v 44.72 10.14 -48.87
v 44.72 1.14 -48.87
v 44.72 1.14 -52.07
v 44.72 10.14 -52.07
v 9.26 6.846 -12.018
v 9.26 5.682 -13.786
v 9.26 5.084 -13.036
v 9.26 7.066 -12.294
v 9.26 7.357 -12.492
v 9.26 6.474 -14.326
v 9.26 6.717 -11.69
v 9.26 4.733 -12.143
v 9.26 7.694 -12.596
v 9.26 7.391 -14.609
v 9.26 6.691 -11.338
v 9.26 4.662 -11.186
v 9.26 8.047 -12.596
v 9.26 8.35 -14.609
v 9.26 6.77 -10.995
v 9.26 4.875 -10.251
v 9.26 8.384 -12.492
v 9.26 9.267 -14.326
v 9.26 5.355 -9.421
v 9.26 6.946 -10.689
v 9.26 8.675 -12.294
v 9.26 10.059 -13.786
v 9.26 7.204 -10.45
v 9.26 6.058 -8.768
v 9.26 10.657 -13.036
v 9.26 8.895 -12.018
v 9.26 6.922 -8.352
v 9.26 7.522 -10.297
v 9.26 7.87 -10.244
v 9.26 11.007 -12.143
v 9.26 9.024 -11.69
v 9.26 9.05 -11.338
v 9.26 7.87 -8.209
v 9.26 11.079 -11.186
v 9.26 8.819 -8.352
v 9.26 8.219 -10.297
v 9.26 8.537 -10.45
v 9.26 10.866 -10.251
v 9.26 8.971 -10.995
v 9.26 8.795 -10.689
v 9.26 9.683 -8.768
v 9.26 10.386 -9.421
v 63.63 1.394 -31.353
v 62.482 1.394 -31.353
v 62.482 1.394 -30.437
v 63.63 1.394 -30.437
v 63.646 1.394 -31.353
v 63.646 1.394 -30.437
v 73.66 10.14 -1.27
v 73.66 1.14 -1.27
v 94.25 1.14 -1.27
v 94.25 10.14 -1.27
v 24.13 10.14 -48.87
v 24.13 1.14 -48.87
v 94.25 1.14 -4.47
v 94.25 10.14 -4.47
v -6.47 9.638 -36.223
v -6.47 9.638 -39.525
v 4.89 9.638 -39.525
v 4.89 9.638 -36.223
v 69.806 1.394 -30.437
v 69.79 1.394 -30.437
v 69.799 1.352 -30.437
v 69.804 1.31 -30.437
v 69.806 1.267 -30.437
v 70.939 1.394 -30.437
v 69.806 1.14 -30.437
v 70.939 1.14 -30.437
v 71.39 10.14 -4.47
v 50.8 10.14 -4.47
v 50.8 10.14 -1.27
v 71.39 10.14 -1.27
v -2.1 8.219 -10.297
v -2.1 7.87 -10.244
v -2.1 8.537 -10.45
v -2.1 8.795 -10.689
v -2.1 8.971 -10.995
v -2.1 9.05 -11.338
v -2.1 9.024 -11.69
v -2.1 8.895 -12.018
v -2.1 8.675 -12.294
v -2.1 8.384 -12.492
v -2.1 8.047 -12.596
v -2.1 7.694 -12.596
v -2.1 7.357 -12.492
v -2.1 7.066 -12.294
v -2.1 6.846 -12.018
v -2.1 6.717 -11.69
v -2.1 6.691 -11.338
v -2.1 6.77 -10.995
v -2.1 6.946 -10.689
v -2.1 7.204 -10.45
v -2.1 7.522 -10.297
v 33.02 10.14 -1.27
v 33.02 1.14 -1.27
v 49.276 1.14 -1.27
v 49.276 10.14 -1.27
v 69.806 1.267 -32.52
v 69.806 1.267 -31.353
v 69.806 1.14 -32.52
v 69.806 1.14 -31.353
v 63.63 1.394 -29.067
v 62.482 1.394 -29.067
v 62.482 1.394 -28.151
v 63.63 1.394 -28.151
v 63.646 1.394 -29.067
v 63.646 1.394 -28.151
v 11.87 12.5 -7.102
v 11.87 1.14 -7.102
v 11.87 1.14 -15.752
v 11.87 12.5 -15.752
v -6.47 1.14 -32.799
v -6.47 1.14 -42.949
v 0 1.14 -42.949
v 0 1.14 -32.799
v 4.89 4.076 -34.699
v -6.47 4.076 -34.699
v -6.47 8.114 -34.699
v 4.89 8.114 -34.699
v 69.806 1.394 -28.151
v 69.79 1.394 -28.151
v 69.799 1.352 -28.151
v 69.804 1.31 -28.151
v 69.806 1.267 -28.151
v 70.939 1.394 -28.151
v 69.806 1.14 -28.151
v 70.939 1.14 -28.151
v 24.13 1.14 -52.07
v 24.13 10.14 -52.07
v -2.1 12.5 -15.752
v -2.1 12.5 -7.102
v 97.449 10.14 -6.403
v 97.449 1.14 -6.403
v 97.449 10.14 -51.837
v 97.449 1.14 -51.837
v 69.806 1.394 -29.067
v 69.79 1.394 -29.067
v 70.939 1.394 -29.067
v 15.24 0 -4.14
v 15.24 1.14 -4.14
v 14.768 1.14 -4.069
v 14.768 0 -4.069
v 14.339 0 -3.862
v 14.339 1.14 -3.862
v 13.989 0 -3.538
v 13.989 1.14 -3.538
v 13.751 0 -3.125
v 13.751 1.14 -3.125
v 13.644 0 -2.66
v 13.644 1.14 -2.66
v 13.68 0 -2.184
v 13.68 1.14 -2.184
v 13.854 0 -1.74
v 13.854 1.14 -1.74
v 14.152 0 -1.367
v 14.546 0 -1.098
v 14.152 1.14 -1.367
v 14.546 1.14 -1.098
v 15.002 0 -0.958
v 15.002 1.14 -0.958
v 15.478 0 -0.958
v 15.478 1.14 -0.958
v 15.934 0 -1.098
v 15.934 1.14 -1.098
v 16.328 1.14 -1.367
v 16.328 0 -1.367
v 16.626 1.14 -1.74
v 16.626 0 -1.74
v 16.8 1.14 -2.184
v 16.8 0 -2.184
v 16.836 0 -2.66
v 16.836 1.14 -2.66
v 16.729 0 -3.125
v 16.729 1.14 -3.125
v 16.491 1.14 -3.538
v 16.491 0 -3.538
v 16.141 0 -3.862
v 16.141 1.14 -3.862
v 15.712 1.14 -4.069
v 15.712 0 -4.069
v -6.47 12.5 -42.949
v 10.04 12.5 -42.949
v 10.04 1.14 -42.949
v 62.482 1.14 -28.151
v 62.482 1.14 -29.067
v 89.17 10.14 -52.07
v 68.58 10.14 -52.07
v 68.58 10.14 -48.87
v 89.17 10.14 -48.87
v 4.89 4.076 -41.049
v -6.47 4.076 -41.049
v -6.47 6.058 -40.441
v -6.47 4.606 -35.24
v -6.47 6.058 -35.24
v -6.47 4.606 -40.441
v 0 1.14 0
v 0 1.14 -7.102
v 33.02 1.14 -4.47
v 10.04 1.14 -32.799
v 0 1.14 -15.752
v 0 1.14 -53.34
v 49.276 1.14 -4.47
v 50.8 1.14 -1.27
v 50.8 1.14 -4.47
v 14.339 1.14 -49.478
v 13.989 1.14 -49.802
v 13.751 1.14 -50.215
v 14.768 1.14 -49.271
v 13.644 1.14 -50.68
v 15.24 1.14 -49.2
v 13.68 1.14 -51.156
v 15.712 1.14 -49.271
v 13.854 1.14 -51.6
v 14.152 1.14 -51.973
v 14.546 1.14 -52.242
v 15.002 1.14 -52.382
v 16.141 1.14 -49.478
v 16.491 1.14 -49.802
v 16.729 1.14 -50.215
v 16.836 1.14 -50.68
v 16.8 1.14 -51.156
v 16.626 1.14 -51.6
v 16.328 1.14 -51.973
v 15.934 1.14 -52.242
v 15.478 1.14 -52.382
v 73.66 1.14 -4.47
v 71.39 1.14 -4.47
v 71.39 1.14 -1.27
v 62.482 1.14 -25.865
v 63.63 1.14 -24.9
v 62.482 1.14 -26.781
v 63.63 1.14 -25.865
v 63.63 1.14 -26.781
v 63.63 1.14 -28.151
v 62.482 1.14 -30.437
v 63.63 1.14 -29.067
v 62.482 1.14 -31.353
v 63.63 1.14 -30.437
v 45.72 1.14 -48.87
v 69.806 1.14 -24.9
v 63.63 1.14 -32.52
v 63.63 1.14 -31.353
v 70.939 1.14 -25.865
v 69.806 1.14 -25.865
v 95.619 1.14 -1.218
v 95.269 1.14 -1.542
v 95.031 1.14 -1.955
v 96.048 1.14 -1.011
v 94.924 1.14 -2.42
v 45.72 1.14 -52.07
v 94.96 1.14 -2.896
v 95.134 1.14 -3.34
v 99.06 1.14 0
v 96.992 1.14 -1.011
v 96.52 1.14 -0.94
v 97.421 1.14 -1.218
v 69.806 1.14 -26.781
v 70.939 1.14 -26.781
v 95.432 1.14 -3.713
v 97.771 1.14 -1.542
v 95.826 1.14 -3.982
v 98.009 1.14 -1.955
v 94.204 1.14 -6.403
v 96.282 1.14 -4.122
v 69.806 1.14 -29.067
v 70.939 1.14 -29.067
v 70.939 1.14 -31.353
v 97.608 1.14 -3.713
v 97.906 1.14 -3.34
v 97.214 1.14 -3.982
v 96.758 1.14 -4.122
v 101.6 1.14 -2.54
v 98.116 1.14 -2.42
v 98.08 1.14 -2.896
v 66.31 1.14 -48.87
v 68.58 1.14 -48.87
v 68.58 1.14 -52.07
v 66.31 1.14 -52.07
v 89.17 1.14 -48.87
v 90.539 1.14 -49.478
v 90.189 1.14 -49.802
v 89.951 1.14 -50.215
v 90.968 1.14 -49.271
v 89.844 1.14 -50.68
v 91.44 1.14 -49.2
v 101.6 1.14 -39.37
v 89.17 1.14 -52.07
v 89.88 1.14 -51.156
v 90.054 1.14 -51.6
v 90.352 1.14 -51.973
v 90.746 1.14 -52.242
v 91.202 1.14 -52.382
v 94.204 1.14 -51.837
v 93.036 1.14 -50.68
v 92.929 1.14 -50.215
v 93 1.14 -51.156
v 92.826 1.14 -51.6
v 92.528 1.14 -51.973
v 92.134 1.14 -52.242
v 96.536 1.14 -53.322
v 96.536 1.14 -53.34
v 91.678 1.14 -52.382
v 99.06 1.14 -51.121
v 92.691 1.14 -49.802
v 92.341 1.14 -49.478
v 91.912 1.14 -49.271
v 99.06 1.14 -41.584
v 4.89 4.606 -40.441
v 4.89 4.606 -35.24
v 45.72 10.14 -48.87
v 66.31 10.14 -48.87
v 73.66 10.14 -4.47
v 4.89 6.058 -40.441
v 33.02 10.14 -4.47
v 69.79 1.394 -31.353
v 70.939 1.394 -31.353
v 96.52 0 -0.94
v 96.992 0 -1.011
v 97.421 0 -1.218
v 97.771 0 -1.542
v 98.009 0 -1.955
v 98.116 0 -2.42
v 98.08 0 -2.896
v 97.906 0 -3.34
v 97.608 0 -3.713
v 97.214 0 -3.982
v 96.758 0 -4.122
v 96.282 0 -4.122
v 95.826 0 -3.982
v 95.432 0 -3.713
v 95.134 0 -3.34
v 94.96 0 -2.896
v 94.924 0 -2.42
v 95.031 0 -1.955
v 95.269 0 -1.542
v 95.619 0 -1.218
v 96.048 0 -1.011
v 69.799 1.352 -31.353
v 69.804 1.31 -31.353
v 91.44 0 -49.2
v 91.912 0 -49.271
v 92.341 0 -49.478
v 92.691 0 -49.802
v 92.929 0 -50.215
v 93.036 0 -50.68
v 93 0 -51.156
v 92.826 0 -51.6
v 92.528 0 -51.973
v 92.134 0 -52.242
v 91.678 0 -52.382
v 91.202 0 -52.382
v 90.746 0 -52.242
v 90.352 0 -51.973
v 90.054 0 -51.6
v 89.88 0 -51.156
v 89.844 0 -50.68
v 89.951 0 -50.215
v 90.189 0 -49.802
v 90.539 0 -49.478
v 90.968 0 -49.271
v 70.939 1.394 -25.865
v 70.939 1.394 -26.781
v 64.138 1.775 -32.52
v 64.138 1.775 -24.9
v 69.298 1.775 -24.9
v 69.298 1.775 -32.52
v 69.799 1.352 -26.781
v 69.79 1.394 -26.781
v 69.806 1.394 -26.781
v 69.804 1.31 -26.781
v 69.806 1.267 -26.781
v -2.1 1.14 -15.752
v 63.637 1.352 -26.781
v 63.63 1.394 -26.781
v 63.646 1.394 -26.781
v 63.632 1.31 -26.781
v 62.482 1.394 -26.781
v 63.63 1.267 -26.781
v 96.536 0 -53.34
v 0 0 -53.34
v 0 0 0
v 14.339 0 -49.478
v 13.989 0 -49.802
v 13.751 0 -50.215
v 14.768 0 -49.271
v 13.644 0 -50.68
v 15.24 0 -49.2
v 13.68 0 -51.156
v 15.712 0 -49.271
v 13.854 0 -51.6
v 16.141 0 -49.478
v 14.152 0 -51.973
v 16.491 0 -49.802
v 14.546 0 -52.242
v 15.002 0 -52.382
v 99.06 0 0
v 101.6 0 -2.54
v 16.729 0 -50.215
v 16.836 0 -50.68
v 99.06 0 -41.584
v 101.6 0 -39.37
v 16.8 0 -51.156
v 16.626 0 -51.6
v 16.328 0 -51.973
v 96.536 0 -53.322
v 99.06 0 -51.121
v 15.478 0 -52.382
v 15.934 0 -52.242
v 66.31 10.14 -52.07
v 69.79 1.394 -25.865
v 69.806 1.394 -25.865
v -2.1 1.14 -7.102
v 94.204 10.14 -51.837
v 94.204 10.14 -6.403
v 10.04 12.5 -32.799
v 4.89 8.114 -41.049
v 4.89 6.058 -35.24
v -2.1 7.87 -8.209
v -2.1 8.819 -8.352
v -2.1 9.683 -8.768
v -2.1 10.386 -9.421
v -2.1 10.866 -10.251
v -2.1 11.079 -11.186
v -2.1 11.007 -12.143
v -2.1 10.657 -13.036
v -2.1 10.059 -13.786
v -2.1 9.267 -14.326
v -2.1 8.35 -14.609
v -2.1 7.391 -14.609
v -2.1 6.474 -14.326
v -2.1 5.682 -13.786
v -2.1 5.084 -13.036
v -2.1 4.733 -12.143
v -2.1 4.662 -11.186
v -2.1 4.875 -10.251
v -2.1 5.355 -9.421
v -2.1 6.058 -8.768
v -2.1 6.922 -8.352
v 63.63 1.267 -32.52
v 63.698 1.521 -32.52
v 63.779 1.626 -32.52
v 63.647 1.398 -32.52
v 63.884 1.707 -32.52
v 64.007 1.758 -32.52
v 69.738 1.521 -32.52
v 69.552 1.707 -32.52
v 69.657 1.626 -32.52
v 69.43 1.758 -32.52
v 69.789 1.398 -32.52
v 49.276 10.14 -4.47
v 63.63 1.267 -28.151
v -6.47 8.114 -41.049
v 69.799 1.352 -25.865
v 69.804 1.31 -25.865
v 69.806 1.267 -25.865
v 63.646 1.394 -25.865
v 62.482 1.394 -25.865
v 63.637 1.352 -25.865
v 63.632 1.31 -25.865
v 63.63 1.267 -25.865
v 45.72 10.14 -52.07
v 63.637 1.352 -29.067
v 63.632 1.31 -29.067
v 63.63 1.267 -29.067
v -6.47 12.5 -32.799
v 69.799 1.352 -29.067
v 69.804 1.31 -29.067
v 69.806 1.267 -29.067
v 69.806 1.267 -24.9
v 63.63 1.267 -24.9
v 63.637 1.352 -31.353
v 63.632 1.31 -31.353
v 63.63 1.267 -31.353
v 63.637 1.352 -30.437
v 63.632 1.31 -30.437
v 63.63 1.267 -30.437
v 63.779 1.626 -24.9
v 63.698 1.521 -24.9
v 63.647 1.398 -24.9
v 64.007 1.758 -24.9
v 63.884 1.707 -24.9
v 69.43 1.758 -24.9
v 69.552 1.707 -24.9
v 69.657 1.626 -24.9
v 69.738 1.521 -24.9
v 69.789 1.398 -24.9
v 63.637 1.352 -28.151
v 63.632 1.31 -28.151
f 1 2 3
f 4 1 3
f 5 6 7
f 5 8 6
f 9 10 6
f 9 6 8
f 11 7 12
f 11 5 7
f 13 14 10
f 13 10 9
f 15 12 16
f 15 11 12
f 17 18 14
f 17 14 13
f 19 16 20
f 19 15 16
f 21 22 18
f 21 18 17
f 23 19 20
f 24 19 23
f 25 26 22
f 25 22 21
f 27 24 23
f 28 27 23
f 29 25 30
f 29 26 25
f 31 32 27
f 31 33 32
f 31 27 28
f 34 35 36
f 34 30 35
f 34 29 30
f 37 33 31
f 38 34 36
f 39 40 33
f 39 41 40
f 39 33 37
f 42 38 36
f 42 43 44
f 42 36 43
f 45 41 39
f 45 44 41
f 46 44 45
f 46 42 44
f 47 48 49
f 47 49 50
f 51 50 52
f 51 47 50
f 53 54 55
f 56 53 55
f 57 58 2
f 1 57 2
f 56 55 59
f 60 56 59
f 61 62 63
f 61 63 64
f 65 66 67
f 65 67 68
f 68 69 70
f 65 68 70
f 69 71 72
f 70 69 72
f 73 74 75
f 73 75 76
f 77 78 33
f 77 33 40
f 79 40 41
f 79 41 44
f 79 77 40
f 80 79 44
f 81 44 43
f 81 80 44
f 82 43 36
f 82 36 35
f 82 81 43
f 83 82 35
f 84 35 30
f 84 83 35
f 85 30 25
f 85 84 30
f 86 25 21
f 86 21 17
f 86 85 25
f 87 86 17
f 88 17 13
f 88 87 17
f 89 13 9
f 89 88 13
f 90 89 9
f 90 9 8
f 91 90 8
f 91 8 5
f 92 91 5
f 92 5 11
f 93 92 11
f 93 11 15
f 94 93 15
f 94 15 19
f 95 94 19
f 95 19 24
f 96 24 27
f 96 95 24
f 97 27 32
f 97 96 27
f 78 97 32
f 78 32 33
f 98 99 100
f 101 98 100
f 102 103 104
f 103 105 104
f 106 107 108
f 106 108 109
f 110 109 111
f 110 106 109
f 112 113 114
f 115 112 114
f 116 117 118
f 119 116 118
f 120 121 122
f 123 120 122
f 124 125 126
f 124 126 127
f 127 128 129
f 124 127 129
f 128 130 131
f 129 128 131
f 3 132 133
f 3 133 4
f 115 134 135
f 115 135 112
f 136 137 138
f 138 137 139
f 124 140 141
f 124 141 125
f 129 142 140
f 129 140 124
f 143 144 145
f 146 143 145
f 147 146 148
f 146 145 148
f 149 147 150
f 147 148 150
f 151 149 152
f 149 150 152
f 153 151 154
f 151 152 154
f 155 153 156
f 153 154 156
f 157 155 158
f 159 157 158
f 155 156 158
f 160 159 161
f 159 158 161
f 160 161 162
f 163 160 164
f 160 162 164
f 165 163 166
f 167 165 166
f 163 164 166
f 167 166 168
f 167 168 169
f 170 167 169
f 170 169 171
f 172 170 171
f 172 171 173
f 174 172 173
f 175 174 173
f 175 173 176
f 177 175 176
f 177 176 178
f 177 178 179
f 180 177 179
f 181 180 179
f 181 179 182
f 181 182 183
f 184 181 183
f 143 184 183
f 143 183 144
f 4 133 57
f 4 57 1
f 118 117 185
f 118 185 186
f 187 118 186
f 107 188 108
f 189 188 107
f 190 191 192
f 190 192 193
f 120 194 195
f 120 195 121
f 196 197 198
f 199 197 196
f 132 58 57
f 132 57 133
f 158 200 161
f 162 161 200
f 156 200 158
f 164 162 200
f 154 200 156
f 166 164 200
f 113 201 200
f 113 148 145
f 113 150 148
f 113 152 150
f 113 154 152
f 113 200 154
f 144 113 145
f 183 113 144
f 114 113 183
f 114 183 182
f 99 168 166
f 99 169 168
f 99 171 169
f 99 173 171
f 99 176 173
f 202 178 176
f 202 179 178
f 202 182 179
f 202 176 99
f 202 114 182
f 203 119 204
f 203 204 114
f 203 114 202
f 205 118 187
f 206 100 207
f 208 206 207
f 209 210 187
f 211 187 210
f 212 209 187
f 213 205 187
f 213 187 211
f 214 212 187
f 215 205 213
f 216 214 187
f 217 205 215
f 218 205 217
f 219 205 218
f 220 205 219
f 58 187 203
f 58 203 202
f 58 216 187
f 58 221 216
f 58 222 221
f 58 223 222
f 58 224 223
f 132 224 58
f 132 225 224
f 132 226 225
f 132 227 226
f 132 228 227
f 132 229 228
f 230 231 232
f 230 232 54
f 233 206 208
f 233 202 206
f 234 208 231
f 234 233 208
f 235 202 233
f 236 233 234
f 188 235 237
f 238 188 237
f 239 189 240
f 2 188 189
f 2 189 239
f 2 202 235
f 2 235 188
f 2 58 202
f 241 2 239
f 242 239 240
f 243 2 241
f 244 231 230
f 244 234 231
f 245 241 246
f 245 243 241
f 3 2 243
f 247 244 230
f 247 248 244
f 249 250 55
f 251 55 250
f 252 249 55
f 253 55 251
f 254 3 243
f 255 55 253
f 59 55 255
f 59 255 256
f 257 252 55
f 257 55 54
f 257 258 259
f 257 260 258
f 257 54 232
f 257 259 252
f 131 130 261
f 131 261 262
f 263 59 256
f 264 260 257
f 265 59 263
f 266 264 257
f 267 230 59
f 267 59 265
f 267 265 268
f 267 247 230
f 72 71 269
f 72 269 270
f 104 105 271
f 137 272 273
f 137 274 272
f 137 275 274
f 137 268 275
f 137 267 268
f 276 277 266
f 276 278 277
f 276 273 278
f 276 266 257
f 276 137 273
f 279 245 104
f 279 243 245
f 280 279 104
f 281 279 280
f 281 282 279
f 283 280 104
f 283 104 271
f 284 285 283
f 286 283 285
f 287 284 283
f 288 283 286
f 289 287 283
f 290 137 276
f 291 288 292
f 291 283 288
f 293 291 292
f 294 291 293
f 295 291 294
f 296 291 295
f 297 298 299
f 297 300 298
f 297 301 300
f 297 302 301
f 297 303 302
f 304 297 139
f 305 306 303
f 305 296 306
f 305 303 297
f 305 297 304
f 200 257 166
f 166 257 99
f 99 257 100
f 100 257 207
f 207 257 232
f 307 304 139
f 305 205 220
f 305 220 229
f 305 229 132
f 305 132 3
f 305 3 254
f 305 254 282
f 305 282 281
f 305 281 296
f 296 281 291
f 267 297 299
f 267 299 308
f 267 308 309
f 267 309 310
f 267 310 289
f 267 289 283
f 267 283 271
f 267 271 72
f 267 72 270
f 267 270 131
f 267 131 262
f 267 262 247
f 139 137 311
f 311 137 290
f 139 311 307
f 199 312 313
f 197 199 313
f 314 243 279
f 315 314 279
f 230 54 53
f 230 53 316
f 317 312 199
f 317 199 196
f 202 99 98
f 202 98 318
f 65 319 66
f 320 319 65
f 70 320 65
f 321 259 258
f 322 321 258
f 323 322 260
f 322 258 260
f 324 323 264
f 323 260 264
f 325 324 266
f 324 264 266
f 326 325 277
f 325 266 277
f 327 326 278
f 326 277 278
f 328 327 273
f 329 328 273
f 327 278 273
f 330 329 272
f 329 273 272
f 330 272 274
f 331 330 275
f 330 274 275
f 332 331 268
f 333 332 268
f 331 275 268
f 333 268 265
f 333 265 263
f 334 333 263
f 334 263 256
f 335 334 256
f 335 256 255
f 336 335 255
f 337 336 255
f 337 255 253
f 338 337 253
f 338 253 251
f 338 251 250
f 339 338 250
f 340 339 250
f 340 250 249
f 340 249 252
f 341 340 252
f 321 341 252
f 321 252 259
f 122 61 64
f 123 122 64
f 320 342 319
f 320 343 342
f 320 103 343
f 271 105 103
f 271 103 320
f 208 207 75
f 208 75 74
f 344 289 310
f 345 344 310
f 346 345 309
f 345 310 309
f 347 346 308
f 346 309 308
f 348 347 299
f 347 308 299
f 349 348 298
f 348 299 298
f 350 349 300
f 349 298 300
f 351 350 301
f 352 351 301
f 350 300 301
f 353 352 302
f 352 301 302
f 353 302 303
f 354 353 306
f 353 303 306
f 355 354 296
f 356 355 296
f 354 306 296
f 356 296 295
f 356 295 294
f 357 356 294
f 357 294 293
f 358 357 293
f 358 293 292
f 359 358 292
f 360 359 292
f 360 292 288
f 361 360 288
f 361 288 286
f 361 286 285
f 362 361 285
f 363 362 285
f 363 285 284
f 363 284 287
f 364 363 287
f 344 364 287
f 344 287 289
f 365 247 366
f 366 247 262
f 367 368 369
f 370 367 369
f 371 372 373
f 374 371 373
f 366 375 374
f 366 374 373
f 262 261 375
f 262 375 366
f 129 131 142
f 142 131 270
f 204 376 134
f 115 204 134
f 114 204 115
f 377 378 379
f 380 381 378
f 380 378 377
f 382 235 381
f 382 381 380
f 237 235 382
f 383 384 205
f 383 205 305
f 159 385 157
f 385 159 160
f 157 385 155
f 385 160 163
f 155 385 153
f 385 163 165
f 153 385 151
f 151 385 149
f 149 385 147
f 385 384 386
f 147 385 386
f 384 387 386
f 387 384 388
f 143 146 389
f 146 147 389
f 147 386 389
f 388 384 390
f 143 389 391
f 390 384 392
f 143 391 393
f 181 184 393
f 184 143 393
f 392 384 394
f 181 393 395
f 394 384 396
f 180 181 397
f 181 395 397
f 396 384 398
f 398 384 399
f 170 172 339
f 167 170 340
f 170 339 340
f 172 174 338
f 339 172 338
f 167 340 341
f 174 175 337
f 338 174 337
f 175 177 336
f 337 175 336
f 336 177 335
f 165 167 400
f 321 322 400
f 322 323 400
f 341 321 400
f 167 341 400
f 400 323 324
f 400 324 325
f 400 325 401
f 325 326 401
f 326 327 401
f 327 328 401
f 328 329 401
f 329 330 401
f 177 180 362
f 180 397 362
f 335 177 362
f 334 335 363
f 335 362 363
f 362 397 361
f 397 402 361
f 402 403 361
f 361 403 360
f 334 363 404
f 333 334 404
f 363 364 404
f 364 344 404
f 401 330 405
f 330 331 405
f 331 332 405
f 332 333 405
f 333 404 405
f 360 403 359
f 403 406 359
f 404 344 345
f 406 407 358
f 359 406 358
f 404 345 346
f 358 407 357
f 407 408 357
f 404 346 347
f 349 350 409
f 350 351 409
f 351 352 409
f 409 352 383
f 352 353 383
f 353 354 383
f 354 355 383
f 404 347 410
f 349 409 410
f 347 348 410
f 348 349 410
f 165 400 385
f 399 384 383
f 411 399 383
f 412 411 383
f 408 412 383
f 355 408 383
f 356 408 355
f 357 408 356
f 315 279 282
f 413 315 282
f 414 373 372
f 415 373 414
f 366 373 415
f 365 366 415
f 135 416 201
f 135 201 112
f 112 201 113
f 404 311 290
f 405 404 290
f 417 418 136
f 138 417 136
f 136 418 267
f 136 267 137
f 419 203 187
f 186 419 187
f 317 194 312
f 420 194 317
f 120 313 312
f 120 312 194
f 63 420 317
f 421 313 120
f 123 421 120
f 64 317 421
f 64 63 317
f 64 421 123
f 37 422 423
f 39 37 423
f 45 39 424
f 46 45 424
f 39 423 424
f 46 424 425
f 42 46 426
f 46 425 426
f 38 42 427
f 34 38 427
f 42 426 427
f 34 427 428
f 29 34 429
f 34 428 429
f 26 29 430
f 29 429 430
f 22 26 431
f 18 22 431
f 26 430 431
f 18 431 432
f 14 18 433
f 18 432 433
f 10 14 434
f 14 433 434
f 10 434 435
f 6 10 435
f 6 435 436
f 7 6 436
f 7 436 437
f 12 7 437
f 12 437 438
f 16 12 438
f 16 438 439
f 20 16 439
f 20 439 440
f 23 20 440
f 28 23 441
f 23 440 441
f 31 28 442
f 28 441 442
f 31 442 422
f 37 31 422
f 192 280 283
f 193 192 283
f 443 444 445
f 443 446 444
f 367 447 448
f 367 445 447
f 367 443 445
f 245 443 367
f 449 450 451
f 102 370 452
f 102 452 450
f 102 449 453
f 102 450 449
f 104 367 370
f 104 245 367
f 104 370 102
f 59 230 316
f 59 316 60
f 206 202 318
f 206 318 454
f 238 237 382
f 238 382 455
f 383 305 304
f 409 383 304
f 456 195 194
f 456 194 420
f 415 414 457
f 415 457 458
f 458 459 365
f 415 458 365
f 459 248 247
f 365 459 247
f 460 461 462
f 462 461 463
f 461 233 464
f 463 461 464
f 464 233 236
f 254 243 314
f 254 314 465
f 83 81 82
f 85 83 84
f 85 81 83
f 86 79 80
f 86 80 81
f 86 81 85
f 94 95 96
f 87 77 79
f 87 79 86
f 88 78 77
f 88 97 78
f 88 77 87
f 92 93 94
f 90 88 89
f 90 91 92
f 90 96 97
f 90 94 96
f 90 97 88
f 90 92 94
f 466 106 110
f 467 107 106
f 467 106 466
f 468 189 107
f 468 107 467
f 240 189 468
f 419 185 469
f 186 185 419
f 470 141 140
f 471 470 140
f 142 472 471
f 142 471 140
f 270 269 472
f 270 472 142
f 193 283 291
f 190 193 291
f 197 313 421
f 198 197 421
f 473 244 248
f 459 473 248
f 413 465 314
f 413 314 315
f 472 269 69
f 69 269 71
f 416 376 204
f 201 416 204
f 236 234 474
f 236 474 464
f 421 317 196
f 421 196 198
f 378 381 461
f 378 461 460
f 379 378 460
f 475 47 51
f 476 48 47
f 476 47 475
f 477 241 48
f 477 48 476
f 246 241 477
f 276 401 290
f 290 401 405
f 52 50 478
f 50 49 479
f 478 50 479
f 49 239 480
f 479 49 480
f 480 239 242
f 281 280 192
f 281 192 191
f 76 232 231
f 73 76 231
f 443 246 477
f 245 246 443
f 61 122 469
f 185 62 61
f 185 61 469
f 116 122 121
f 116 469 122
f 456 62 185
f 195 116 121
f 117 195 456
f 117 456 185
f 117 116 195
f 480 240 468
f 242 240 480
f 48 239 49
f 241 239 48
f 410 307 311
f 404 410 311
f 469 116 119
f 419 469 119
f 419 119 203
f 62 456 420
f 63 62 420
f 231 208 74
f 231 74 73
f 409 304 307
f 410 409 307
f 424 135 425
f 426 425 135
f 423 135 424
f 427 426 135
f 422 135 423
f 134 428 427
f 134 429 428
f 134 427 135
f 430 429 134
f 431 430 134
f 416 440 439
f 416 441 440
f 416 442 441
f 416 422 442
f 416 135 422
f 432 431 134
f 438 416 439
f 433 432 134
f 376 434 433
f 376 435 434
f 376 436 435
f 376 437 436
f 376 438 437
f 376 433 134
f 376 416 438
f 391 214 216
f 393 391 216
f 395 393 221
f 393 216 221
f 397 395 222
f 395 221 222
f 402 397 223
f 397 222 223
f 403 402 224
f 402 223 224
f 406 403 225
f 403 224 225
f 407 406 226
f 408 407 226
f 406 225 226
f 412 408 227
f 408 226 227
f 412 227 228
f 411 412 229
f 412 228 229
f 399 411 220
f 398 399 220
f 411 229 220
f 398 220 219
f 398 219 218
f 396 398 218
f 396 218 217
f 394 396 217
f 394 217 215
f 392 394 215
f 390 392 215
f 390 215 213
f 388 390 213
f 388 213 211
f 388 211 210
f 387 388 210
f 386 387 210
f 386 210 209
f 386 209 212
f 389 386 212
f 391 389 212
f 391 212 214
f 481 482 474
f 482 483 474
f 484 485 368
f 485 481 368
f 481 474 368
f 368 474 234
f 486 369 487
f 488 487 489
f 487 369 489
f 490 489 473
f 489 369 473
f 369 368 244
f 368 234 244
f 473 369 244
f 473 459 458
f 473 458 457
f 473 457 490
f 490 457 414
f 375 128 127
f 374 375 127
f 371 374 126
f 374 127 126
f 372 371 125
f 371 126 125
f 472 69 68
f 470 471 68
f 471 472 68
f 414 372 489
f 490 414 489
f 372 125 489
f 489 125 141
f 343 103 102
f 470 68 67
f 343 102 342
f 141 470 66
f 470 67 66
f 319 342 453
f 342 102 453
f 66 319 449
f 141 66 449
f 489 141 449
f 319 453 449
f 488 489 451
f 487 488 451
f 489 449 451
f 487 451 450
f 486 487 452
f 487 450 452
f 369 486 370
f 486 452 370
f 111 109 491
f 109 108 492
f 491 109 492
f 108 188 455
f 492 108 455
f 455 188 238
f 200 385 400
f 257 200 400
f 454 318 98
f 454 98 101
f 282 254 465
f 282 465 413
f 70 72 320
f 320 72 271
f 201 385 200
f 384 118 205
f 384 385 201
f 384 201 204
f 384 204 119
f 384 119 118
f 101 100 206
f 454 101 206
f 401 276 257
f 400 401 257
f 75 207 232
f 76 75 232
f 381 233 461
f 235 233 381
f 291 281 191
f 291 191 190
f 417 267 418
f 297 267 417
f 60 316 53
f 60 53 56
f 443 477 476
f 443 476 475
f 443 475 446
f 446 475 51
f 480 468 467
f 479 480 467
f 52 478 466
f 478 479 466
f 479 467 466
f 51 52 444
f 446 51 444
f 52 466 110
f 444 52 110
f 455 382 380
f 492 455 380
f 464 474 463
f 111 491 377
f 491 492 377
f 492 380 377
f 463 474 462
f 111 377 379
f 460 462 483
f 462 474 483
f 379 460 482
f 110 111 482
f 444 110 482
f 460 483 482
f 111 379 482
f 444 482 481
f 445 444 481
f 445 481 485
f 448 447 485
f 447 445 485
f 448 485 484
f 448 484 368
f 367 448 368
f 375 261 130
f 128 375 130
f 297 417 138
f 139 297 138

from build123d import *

# Parameters (mm, degrees)
SKETCH2_W           = 101.6
SKETCH2_H           = 53.34
BOSS_EXTRUDE1_DEPTH = 1.14
SKETCH3_R           = 1.6
CUT_EXTRUDE1_DEPTH  = 115.756329673
SKETCH4_W           = 20.59
SKETCH4_H           = 3.2
SKETCH4_W_2         = 16.256
BOSS_EXTRUDE2_DEPTH = 9
CUT_EXTRUDE2_DEPTH  = 116.10306512
SKETCH6_R           = 1.6
CUT_EXTRUDE3_DEPTH  = 116.10306512
SKETCH7_W           = 3.245231175
SKETCH7_H           = 45.43323645
BOSS_EXTRUDE3_DEPTH = 9
SKETCH8_W           = 16.51
SKETCH8_H           = 10.150135712
SKETCH8_W_2         = 13.97
SKETCH8_H_2         = 8.650400862
BOSS_EXTRUDE4_DEPTH = 11.36
SKETCH9_R           = 3.217681585
SKETCH9_R_2         = 1.182707285
CUT_EXTRUDE4_DEPTH  = 11.36
SKETCH10_W          = 6.35
SKETCH10_H          = 5.56209116
SKETCH10_W_2        = 5.200759748
SKETCH10_H_2        = 1.452464435
CUT_EXTRUDE5_DEPTH  = 11.36
CHAMFER1_SIZE       = 1.524
SKETCH11_W          = 6.176206758
SKETCH11_H          = 7.62
BOSS_EXTRUDE5_DEPTH = 0.635
SKETCH12_W          = 8.456815018
SKETCH12_H          = 0.915706085
BOSS_EXTRUDE6_DEPTH = 0.254
FILLET1_R           = 0.508


with BuildPart() as part:
    # Sketch2 → Boss-Extrude1 (new body)
    with BuildSketch(Plane(origin=(0, 0, 0), x_dir=(1, 0, 0), z_dir=(0, 1, 0))):
        with Locations((50.8, 26.67)):
            Rectangle(SKETCH2_W, SKETCH2_H)
    extrude(amount=BOSS_EXTRUDE1_DEPTH)

    # Sketch3 → Cut-Extrude1 (cut, through all)
    with BuildSketch(Plane(origin=(0, 1.14, 0), x_dir=(1, 0, 0), z_dir=(0, 1, 0))):
        with Locations(Location((15.24, 50.8, 0), (0, 0, 270))):
            Circle(SKETCH3_R)
        with Locations(Location((15.24, 2.54, 0), (0, 0, 90))):
            Circle(SKETCH3_R)
    extrude(amount=-CUT_EXTRUDE1_DEPTH, mode=Mode.SUBTRACT)

    # Sketch4 → Boss-Extrude2 (add)
    with BuildSketch(Plane(origin=(0, 1.14, 0), x_dir=(1, 0, 0), z_dir=(0, 1, 0))):
        with Locations((56.015, 50.47)):
            Rectangle(SKETCH4_W, SKETCH4_H)
        with Locations((34.425, 50.47)):
            Rectangle(SKETCH4_W, SKETCH4_H)
        with Locations((78.875, 50.47)):
            Rectangle(SKETCH4_W, SKETCH4_H)
        with Locations((83.955, 2.87)):
            Rectangle(SKETCH4_W, SKETCH4_H)
        with Locations((61.095, 2.87)):
            Rectangle(SKETCH4_W, SKETCH4_H)
        with Locations((41.148, 2.87)):
            Rectangle(SKETCH4_W_2, SKETCH4_H)
    extrude(amount=BOSS_EXTRUDE2_DEPTH)

    # Sketch5 → Cut-Extrude2 (cut, through all)
    with BuildSketch(Plane(origin=(0, 1.14, 0), x_dir=(1, 0, 0), z_dir=(0, 1, 0))):
        Polygon((99.06, 0), (101.6, 0), (101.6, 2.54), align=None)
        Polygon((99.06, 41.584296227), (101.6, 39.37), (101.6, 53.321621524), (101.6, 53.34), (96.536046111, 53.34), (96.536046111, 53.321621524), (99.06, 51.121313818), align=None)
    extrude(amount=-CUT_EXTRUDE2_DEPTH, mode=Mode.SUBTRACT)

    # Sketch6 → Cut-Extrude3 (cut, through all)
    with BuildSketch(Plane(origin=(0, 1.14, 0), x_dir=(1, 0, 0), z_dir=(0, 1, 0))):
        with Locations(Location((96.52, 2.54, 0), (0, 0, 270))):
            Circle(SKETCH6_R)
        with Locations(Location((91.44, 50.8, 0), (0, 0, 270))):
            Circle(SKETCH6_R)
    extrude(amount=-CUT_EXTRUDE3_DEPTH, mode=Mode.SUBTRACT)

    # Sketch7 → Boss-Extrude3 (add)
    with BuildSketch(Plane(origin=(0, 1.14, 0), x_dir=(1, 0, 0), z_dir=(0, 1, 0))):
        with Locations((95.826679511, 29.119940639)):
            Rectangle(SKETCH7_W, SKETCH7_H)
    extrude(amount=BOSS_EXTRUDE3_DEPTH)

    # Sketch8 → Boss-Extrude4 (add)
    with BuildSketch(Plane(origin=(0, 1.14, 0), x_dir=(1, 0, 0), z_dir=(0, 1, 0))):
        with Locations((1.785, 37.873809091)):
            Rectangle(SKETCH8_W, SKETCH8_H)
        with Locations((4.885, 11.42677262)):
            Rectangle(SKETCH8_W_2, SKETCH8_H_2)
    extrude(amount=BOSS_EXTRUDE4_DEPTH)

    # Sketch9 → Cut-Extrude4 (cut)
    with BuildSketch(Plane.ZY.offset(2.1)):
        with Locations((-11.42677262, 7.870480003)):
            Circle(SKETCH9_R)
        with Locations((-11.42677262, 7.870480003)):
            Circle(SKETCH9_R_2, mode=Mode.SUBTRACT)
    extrude(amount=-CUT_EXTRUDE4_DEPTH, mode=Mode.SUBTRACT)

    # Sketch10 → Cut-Extrude5 (cut)
    with BuildSketch(Plane.ZY.offset(6.47)):
        with Locations((-37.873809091, 6.856773581)):
            Rectangle(SKETCH10_W, SKETCH10_H)
        with Locations((-37.84018947, 5.332133236)):
            Rectangle(SKETCH10_W_2, SKETCH10_H_2, mode=Mode.SUBTRACT)
    extrude(amount=-CUT_EXTRUDE5_DEPTH, mode=Mode.SUBTRACT)

    # Chamfer1
    chamfer1_edges = [part.edges().sort_by_distance(p)[0] for p in [
        (-0.79, 9.637819161, -41.048809091),
        (-0.79, 9.637819161, -34.698809091),
    ]]
    chamfer(chamfer1_edges, length=CHAMFER1_SIZE)

    # Sketch11 → Boss-Extrude5 (add)
    with BuildSketch(Plane(origin=(0, 1.14, 0), x_dir=(1, 0, 0), z_dir=(0, 1, 0))):
        with Locations((66.718103379, 28.71)):
            Rectangle(SKETCH11_W, SKETCH11_H)
    extrude(amount=BOSS_EXTRUDE5_DEPTH)

    # Sketch12 → Boss-Extrude6 (add)
    with BuildSketch(Plane(origin=(0, 1.14, 0), x_dir=(1, 0, 0), z_dir=(0, 1, 0))):
        with Locations((66.71021047, 28.609003409)):
            Rectangle(SKETCH12_W, SKETCH12_H)
        with Locations((66.71021047, 30.895003409)):
            Rectangle(SKETCH12_W, SKETCH12_H)
        with Locations((66.71021047, 26.323003408)):
            Rectangle(SKETCH12_W, SKETCH12_H)
    extrude(amount=BOSS_EXTRUDE6_DEPTH)

    # Fillet1
    # the kernel refuses this fillet: 0.508 mm, written as the material it takes off along each edge
    with BuildSketch(Plane(origin=(69.806206758, 1.775, -33.79), x_dir=(0, -1, 0), z_dir=(0, 0, 1))) as fillet1_piece_1_section:
        with BuildLine():
            CenterArc((FILLET1_R, -FILLET1_R), FILLET1_R, 90, 90)
            Line((0, -FILLET1_R), (0, 0))
            Line((0, 0), (FILLET1_R, 0))
        make_face()
    fillet1_piece_1 = extrude(amount=10.16, mode=Mode.PRIVATE)
    fillet1_piece_1 = split(fillet1_piece_1, bisect_by=Plane(origin=(69.801380886, 1.362351692, -31.352856451), z_dir=(0, 0, -1)), keep=Keep.TOP, mode=Mode.PRIVATE)
    add(fillet1_piece_1, mode=Mode.SUBTRACT)
    with BuildSketch(Plane(origin=(69.806206758, 1.775, -33.79), x_dir=(0, -1, 0), z_dir=(0, 0, 1))) as fillet1_piece_2_section:
        with BuildLine():
            CenterArc((FILLET1_R, -FILLET1_R), FILLET1_R, 90, 90)
            Line((0, -FILLET1_R), (0, 0))
            Line((0, 0), (FILLET1_R, 0))
        make_face()
    fillet1_piece_2 = extrude(amount=10.16, mode=Mode.PRIVATE)
    fillet1_piece_2 = split(fillet1_piece_2, bisect_by=Plane(origin=(69.691388297, 1.394, -30.895003408), z_dir=(0, 1, 0)), keep=Keep.TOP, mode=Mode.PRIVATE)
    add(fillet1_piece_2, mode=Mode.SUBTRACT)
    with BuildSketch(Plane(origin=(69.806206758, 1.775, -33.79), x_dir=(0, -1, 0), z_dir=(0, 0, 1))) as fillet1_piece_3_section:
        with BuildLine():
            CenterArc((FILLET1_R, -FILLET1_R), FILLET1_R, 90, 90)
            Line((0, -FILLET1_R), (0, 0))
            Line((0, 0), (FILLET1_R, 0))
        make_face()
    fillet1_piece_3 = extrude(amount=10.16, mode=Mode.PRIVATE)
    fillet1_piece_3 = split(fillet1_piece_3, bisect_by=Plane(origin=(69.801380886, 1.362351692, -29.066856451), z_dir=(0, 0, -1)), keep=Keep.TOP, mode=Mode.PRIVATE)
    fillet1_piece_3 = split(fillet1_piece_3, bisect_by=Plane(origin=(69.801380886, 1.362351692, -30.437150366), z_dir=(0, 0, 1)), keep=Keep.TOP, mode=Mode.PRIVATE)
    add(fillet1_piece_3, mode=Mode.SUBTRACT)
    with BuildSketch(Plane(origin=(69.806206758, 1.775, -33.79), x_dir=(0, -1, 0), z_dir=(0, 0, 1))) as fillet1_piece_4_section:
        with BuildLine():
            CenterArc((FILLET1_R, -FILLET1_R), FILLET1_R, 90, 90)
            Line((0, -FILLET1_R), (0, 0))
            Line((0, 0), (FILLET1_R, 0))
        make_face()
    fillet1_piece_4 = extrude(amount=10.16, mode=Mode.PRIVATE)
    fillet1_piece_4 = split(fillet1_piece_4, bisect_by=Plane(origin=(69.801380886, 1.362351692, -26.780856451), z_dir=(0, 0, -1)), keep=Keep.TOP, mode=Mode.PRIVATE)
    fillet1_piece_4 = split(fillet1_piece_4, bisect_by=Plane(origin=(69.801380886, 1.362351692, -28.151150366), z_dir=(0, 0, 1)), keep=Keep.TOP, mode=Mode.PRIVATE)
    add(fillet1_piece_4, mode=Mode.SUBTRACT)
    with BuildSketch(Plane(origin=(69.806206758, 1.775, -33.79), x_dir=(0, -1, 0), z_dir=(0, 0, 1))) as fillet1_piece_5_section:
        with BuildLine():
            CenterArc((FILLET1_R, -FILLET1_R), FILLET1_R, 90, 90)
            Line((0, -FILLET1_R), (0, 0))
            Line((0, 0), (FILLET1_R, 0))
        make_face()
    fillet1_piece_5 = extrude(amount=10.16, mode=Mode.PRIVATE)
    fillet1_piece_5 = split(fillet1_piece_5, bisect_by=Plane(origin=(69.801380886, 1.362351692, -25.865150366), z_dir=(0, 0, 1)), keep=Keep.TOP, mode=Mode.PRIVATE)
    add(fillet1_piece_5, mode=Mode.SUBTRACT)
    with BuildSketch(Plane(origin=(63.63, 1.775, -23.63), x_dir=(0, -1, 0), z_dir=(0, 0, -1))) as fillet1_piece_6_section:
        with BuildLine():
            CenterArc((FILLET1_R, -FILLET1_R), FILLET1_R, 90, 90)
            Line((0, -FILLET1_R), (0, 0))
            Line((0, 0), (FILLET1_R, 0))
        make_face()
    fillet1_piece_6 = extrude(amount=10.16, mode=Mode.PRIVATE)
    fillet1_piece_6 = split(fillet1_piece_6, bisect_by=Plane(origin=(63.634825872, 1.362351692, -25.865150366), z_dir=(0, 0, 1)), keep=Keep.TOP, mode=Mode.PRIVATE)
    add(fillet1_piece_6, mode=Mode.SUBTRACT)
    with BuildSketch(Plane(origin=(63.63, 1.775, -23.63), x_dir=(0, -1, 0), z_dir=(0, 0, -1))) as fillet1_piece_7_section:
        with BuildLine():
            CenterArc((FILLET1_R, -FILLET1_R), FILLET1_R, 90, 90)
            Line((0, -FILLET1_R), (0, 0))
            Line((0, 0), (FILLET1_R, 0))
        make_face()
    fillet1_piece_7 = extrude(amount=10.16, mode=Mode.PRIVATE)
    fillet1_piece_7 = split(fillet1_piece_7, bisect_by=Plane(origin=(63.744818461, 1.394, -26.323003408), z_dir=(0, 1, 0)), keep=Keep.TOP, mode=Mode.PRIVATE)
    add(fillet1_piece_7, mode=Mode.SUBTRACT)
    with BuildSketch(Plane(origin=(63.63, 1.775, -23.63), x_dir=(0, -1, 0), z_dir=(0, 0, -1))) as fillet1_piece_8_section:
        with BuildLine():
            CenterArc((FILLET1_R, -FILLET1_R), FILLET1_R, 90, 90)
            Line((0, -FILLET1_R), (0, 0))
            Line((0, 0), (FILLET1_R, 0))
        make_face()
    fillet1_piece_8 = extrude(amount=10.16, mode=Mode.PRIVATE)
    fillet1_piece_8 = split(fillet1_piece_8, bisect_by=Plane(origin=(63.634825872, 1.362351692, -28.151150366), z_dir=(0, 0, 1)), keep=Keep.TOP, mode=Mode.PRIVATE)
    fillet1_piece_8 = split(fillet1_piece_8, bisect_by=Plane(origin=(63.634825872, 1.362351692, -26.780856451), z_dir=(0, 0, -1)), keep=Keep.TOP, mode=Mode.PRIVATE)
    add(fillet1_piece_8, mode=Mode.SUBTRACT)
    with BuildSketch(Plane(origin=(63.63, 1.775, -23.63), x_dir=(0, -1, 0), z_dir=(0, 0, -1))) as fillet1_piece_9_section:
        with BuildLine():
            CenterArc((FILLET1_R, -FILLET1_R), FILLET1_R, 90, 90)
            Line((0, -FILLET1_R), (0, 0))
            Line((0, 0), (FILLET1_R, 0))
        make_face()
    fillet1_piece_9 = extrude(amount=10.16, mode=Mode.PRIVATE)
    fillet1_piece_9 = split(fillet1_piece_9, bisect_by=Plane(origin=(63.634825872, 1.362351692, -30.437150366), z_dir=(0, 0, 1)), keep=Keep.TOP, mode=Mode.PRIVATE)
    fillet1_piece_9 = split(fillet1_piece_9, bisect_by=Plane(origin=(63.634825872, 1.362351692, -29.066856451), z_dir=(0, 0, -1)), keep=Keep.TOP, mode=Mode.PRIVATE)
    add(fillet1_piece_9, mode=Mode.SUBTRACT)
    with BuildSketch(Plane(origin=(63.63, 1.775, -23.63), x_dir=(0, -1, 0), z_dir=(0, 0, -1))) as fillet1_piece_10_section:
        with BuildLine():
            CenterArc((FILLET1_R, -FILLET1_R), FILLET1_R, 90, 90)
            Line((0, -FILLET1_R), (0, 0))
            Line((0, 0), (FILLET1_R, 0))
        make_face()
    fillet1_piece_10 = extrude(amount=10.16, mode=Mode.PRIVATE)
    fillet1_piece_10 = split(fillet1_piece_10, bisect_by=Plane(origin=(63.634825872, 1.362351692, -31.352856451), z_dir=(0, 0, -1)), keep=Keep.TOP, mode=Mode.PRIVATE)
    add(fillet1_piece_10, mode=Mode.SUBTRACT)


solid = part.part
